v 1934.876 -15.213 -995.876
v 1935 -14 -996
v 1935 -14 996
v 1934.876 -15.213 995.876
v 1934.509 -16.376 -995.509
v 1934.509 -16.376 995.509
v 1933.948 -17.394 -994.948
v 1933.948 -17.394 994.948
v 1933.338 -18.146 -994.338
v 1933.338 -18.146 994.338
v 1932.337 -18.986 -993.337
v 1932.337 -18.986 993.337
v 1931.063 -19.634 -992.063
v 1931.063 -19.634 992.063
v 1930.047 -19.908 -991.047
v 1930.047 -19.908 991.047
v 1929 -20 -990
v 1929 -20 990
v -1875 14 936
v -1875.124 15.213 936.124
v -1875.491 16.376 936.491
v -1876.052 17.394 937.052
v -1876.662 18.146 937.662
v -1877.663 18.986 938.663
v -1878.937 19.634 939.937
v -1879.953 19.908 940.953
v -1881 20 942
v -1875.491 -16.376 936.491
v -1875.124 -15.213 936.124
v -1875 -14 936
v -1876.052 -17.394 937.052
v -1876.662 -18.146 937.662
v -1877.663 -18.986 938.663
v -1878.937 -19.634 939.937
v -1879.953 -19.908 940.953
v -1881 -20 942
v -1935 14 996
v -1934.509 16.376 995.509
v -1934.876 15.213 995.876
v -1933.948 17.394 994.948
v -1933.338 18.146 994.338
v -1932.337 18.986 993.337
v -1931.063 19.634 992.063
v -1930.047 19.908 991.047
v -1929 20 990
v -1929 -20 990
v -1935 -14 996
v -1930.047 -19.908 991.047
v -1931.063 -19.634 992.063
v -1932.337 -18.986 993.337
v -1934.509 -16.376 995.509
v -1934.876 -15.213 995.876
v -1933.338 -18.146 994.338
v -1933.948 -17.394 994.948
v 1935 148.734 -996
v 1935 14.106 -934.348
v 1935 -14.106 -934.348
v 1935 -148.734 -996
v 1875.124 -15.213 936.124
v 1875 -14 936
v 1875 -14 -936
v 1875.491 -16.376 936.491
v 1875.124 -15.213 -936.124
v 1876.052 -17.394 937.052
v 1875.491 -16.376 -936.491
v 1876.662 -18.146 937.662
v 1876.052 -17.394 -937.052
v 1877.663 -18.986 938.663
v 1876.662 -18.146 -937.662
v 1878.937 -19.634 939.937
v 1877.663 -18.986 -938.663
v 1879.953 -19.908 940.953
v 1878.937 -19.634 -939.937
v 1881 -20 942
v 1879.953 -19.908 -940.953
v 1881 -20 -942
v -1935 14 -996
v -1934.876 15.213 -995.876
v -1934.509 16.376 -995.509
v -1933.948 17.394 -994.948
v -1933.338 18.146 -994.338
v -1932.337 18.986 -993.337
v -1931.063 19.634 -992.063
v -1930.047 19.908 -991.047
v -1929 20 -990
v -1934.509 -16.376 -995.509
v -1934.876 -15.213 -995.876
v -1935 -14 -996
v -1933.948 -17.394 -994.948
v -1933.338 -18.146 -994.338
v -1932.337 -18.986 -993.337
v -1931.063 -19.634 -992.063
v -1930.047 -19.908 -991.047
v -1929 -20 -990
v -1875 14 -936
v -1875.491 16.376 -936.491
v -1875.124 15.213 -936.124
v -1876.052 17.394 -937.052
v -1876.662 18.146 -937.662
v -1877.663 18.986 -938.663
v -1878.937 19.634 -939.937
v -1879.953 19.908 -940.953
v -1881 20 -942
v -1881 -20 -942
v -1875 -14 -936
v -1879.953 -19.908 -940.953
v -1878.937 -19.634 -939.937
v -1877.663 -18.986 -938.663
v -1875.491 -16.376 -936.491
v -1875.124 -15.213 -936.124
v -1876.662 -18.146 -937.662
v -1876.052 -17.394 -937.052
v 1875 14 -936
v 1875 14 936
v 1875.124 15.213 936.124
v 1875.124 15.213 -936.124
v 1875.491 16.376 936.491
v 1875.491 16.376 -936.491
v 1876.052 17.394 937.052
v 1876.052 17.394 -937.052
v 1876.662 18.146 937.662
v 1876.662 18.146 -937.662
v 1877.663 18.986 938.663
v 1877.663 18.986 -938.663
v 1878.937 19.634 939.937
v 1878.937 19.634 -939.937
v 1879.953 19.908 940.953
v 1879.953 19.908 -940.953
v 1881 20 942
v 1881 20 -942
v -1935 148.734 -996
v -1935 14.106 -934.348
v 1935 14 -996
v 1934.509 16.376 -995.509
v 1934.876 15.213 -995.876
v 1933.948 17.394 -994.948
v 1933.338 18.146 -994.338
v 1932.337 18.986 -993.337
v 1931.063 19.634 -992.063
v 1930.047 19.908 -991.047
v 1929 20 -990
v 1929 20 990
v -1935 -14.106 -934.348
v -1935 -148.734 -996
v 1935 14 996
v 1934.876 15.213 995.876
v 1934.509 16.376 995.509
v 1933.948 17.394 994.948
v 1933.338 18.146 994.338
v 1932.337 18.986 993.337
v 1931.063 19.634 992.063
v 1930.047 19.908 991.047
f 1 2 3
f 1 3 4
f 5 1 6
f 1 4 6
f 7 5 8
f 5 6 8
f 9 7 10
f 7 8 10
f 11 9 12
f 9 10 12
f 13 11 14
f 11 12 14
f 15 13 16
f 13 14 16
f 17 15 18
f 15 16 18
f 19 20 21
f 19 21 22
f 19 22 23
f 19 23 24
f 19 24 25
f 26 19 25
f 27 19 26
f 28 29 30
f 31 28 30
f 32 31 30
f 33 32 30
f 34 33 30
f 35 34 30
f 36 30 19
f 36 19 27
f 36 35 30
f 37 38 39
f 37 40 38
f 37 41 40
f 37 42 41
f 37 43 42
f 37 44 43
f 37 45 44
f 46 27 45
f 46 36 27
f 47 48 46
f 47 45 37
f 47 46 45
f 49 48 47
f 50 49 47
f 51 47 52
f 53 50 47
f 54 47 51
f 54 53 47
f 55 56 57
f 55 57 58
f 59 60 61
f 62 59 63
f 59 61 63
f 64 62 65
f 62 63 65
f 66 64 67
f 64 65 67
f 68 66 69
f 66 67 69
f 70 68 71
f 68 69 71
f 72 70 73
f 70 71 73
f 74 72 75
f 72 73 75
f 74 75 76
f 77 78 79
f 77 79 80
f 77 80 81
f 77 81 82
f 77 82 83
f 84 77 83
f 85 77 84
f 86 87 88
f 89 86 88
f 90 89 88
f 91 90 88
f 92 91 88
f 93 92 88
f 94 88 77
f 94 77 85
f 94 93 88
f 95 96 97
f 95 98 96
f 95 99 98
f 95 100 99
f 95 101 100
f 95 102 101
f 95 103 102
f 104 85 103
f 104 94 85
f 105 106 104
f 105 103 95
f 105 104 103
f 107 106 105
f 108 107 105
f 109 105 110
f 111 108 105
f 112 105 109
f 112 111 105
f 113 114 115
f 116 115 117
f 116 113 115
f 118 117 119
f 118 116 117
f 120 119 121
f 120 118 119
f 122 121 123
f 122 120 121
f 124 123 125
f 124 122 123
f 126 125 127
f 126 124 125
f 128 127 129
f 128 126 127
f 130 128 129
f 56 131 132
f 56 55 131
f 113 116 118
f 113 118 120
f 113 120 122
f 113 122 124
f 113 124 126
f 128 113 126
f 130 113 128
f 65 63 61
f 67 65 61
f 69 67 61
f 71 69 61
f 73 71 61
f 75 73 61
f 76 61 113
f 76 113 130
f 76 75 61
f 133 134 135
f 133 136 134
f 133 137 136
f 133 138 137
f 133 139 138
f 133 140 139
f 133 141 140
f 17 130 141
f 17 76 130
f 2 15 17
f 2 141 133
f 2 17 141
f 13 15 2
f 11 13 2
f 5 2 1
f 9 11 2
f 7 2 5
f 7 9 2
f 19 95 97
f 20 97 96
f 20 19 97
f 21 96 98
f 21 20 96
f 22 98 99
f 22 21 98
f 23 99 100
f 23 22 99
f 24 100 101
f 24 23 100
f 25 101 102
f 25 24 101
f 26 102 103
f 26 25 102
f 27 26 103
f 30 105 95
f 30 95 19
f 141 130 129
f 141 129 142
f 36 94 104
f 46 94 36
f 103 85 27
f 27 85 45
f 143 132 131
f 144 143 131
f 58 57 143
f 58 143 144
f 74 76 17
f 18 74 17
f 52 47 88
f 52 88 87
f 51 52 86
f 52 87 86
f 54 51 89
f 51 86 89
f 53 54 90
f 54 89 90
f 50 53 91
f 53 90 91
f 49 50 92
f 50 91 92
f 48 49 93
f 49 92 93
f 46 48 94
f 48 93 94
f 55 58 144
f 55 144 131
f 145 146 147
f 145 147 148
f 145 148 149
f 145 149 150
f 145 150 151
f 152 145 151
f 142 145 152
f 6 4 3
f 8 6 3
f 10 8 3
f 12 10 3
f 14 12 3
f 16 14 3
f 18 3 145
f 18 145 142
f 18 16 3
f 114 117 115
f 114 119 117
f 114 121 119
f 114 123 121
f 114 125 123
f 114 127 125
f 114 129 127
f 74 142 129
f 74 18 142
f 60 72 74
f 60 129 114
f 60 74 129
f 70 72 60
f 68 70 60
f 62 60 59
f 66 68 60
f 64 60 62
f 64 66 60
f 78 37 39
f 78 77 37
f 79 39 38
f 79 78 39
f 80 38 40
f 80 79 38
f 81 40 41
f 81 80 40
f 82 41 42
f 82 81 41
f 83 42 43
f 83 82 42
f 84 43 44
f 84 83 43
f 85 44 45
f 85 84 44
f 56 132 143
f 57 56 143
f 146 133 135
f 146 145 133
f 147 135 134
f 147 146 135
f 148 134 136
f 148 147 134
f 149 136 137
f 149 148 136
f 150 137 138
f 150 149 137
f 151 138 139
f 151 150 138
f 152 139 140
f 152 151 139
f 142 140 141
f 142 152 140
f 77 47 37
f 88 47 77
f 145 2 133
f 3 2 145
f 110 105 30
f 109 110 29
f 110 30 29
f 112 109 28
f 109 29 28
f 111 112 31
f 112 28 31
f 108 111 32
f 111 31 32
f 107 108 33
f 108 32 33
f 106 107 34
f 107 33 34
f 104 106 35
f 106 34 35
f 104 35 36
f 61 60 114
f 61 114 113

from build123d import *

# Parameters (mm, degrees)
F1_DEPTH      = 20
F3_DEPTH      = 477.5
F4_R          = 6
F4_2_R        = 6
F7_DEPTH      = 1935
F7_DEPTH_BACK = 1935
F8_W          = 3750.3852844238
F8_H          = 4.1501820087
F9_DEPTH      = 10


# Not quite as in the source:
# - a feature names something its author has since deleted; it is built from what else it names


with BuildPart() as f1:
    # F0 (on Front) → F1 (new body, symmetric)
    with BuildSketch(Plane.XZ):
        Polygon((-1875, -936), (-1875, 936), (-1935, 996), (-1935, -996), align=None)
    extrude(amount=F1_DEPTH, both=True)

    # F4
    f4_edges = [f1.edges().sort_by_distance(p)[0] for p in [
        (-1875, -20, 0),
        (-1935, -20, 0),
        (-1875, 20, 0),
        (-1935, 20, 0),
    ]]
    fillet(f4_edges, radius=F4_R)


with BuildPart() as f1b:
    # F0 (on Front) → F1, piece 2 (new body, symmetric)
    with BuildSketch(Plane.XZ):
        Polygon((1935, -996), (1935, 996), (1875, 936), (1875, -936), align=None)
    extrude(amount=F1_DEPTH, both=True)

    # F4#2
    f4_2_edges = [f1b.edges().sort_by_distance(p)[0] for p in [
        (1935, -20, 0),
        (1875, -20, 0),
        (1935, 20, 0),
        (1875, 20, 0),
    ]]
    fillet(f4_2_edges, radius=F4_2_R)


with BuildPart() as f3:
    # F2 (on Top) → F3 (new body, symmetric)
    with BuildSketch(Plane.XY):
        with BuildLine():
            ThreePointArc((-758, 14), (-758.8786796564, 16.1213203436), (-761, 17))
            Line((-761, 17), (-809, 17))
            ThreePointArc((-809, 17), (-811.1213203436, 16.1213203436), (-812, 14))
            Line((-812, 14), (-812, -14))
            ThreePointArc((-812, -14), (-811.1213203436, -16.1213203436), (-809, -17))
            Line((-809, -17), (-761, -17))
            ThreePointArc((-761, -17), (-758.8786796564, -16.1213203436), (-758, -14))
            Line((-758, -14), (-758, 14))
        make_face()
    extrude(amount=F3_DEPTH, both=True)


with BuildPart() as f3b:
    # F2 (on Top) → F3, piece 2 (new body, symmetric)
    with BuildSketch(Plane.XY):
        with BuildLine():
            ThreePointArc((809, -17), (811.1213203436, -16.1213203436), (812, -14))
            Line((812, -14), (812, 14))
            ThreePointArc((812, 14), (811.1213203436, 16.1213203436), (809, 17))
            Line((809, 17), (761, 17))
            ThreePointArc((761, 17), (758.8786796564, 16.1213203436), (758, 14))
            Line((758, 14), (758, -14))
            ThreePointArc((758, -14), (758.8786796564, -16.1213203436), (761, -17))
            Line((761, -17), (809, -17))
        make_face()
    extrude(amount=F3_DEPTH, both=True)


with BuildPart() as f1b_1:
    add(f1b.part)

    # F5: cut F3, F3b
    add(f3.part, mode=Mode.SUBTRACT)
    add(f3b.part, mode=Mode.SUBTRACT)


with BuildPart() as f1_1:
    add(f1.part)

    # F5: cut F3, F3b
    add(f3.part, mode=Mode.SUBTRACT)
    add(f3b.part, mode=Mode.SUBTRACT)

    # F8 (on face) → F9 (cut)
    with BuildSketch(Plane(origin=(0, 351.2576934301, -767.0319016123), x_dir=(1, 0, 0), z_dir=(0, -0.4163621946, 0.9091988357))):
        with Locations((-0.204205513, -176.041290164)):
            Rectangle(F8_W, F8_H)
        with Locations((-0.204205513, -171.8911081553)):
            Rectangle(F8_W, F8_H)
    extrude(amount=-F9_DEPTH, mode=Mode.SUBTRACT)


with BuildPart() as f7:
    # F6 (on Right) → F7 (new body, two sides)
    with BuildSketch(Plane.YZ) as f7_sk:
        Polygon((14.1061842442, -934.3481144905), (0, -934.3481144905), (-14.1061842442, -934.3481144905), (-148.7337350845, -996), (0, -996), (148.7337350845, -996), align=None)
    extrude(amount=F7_DEPTH)
    extrude(f7_sk.sketch, amount=-F7_DEPTH_BACK)


solid = Compound([f1b_1.part, f1_1.part, f7.part])
